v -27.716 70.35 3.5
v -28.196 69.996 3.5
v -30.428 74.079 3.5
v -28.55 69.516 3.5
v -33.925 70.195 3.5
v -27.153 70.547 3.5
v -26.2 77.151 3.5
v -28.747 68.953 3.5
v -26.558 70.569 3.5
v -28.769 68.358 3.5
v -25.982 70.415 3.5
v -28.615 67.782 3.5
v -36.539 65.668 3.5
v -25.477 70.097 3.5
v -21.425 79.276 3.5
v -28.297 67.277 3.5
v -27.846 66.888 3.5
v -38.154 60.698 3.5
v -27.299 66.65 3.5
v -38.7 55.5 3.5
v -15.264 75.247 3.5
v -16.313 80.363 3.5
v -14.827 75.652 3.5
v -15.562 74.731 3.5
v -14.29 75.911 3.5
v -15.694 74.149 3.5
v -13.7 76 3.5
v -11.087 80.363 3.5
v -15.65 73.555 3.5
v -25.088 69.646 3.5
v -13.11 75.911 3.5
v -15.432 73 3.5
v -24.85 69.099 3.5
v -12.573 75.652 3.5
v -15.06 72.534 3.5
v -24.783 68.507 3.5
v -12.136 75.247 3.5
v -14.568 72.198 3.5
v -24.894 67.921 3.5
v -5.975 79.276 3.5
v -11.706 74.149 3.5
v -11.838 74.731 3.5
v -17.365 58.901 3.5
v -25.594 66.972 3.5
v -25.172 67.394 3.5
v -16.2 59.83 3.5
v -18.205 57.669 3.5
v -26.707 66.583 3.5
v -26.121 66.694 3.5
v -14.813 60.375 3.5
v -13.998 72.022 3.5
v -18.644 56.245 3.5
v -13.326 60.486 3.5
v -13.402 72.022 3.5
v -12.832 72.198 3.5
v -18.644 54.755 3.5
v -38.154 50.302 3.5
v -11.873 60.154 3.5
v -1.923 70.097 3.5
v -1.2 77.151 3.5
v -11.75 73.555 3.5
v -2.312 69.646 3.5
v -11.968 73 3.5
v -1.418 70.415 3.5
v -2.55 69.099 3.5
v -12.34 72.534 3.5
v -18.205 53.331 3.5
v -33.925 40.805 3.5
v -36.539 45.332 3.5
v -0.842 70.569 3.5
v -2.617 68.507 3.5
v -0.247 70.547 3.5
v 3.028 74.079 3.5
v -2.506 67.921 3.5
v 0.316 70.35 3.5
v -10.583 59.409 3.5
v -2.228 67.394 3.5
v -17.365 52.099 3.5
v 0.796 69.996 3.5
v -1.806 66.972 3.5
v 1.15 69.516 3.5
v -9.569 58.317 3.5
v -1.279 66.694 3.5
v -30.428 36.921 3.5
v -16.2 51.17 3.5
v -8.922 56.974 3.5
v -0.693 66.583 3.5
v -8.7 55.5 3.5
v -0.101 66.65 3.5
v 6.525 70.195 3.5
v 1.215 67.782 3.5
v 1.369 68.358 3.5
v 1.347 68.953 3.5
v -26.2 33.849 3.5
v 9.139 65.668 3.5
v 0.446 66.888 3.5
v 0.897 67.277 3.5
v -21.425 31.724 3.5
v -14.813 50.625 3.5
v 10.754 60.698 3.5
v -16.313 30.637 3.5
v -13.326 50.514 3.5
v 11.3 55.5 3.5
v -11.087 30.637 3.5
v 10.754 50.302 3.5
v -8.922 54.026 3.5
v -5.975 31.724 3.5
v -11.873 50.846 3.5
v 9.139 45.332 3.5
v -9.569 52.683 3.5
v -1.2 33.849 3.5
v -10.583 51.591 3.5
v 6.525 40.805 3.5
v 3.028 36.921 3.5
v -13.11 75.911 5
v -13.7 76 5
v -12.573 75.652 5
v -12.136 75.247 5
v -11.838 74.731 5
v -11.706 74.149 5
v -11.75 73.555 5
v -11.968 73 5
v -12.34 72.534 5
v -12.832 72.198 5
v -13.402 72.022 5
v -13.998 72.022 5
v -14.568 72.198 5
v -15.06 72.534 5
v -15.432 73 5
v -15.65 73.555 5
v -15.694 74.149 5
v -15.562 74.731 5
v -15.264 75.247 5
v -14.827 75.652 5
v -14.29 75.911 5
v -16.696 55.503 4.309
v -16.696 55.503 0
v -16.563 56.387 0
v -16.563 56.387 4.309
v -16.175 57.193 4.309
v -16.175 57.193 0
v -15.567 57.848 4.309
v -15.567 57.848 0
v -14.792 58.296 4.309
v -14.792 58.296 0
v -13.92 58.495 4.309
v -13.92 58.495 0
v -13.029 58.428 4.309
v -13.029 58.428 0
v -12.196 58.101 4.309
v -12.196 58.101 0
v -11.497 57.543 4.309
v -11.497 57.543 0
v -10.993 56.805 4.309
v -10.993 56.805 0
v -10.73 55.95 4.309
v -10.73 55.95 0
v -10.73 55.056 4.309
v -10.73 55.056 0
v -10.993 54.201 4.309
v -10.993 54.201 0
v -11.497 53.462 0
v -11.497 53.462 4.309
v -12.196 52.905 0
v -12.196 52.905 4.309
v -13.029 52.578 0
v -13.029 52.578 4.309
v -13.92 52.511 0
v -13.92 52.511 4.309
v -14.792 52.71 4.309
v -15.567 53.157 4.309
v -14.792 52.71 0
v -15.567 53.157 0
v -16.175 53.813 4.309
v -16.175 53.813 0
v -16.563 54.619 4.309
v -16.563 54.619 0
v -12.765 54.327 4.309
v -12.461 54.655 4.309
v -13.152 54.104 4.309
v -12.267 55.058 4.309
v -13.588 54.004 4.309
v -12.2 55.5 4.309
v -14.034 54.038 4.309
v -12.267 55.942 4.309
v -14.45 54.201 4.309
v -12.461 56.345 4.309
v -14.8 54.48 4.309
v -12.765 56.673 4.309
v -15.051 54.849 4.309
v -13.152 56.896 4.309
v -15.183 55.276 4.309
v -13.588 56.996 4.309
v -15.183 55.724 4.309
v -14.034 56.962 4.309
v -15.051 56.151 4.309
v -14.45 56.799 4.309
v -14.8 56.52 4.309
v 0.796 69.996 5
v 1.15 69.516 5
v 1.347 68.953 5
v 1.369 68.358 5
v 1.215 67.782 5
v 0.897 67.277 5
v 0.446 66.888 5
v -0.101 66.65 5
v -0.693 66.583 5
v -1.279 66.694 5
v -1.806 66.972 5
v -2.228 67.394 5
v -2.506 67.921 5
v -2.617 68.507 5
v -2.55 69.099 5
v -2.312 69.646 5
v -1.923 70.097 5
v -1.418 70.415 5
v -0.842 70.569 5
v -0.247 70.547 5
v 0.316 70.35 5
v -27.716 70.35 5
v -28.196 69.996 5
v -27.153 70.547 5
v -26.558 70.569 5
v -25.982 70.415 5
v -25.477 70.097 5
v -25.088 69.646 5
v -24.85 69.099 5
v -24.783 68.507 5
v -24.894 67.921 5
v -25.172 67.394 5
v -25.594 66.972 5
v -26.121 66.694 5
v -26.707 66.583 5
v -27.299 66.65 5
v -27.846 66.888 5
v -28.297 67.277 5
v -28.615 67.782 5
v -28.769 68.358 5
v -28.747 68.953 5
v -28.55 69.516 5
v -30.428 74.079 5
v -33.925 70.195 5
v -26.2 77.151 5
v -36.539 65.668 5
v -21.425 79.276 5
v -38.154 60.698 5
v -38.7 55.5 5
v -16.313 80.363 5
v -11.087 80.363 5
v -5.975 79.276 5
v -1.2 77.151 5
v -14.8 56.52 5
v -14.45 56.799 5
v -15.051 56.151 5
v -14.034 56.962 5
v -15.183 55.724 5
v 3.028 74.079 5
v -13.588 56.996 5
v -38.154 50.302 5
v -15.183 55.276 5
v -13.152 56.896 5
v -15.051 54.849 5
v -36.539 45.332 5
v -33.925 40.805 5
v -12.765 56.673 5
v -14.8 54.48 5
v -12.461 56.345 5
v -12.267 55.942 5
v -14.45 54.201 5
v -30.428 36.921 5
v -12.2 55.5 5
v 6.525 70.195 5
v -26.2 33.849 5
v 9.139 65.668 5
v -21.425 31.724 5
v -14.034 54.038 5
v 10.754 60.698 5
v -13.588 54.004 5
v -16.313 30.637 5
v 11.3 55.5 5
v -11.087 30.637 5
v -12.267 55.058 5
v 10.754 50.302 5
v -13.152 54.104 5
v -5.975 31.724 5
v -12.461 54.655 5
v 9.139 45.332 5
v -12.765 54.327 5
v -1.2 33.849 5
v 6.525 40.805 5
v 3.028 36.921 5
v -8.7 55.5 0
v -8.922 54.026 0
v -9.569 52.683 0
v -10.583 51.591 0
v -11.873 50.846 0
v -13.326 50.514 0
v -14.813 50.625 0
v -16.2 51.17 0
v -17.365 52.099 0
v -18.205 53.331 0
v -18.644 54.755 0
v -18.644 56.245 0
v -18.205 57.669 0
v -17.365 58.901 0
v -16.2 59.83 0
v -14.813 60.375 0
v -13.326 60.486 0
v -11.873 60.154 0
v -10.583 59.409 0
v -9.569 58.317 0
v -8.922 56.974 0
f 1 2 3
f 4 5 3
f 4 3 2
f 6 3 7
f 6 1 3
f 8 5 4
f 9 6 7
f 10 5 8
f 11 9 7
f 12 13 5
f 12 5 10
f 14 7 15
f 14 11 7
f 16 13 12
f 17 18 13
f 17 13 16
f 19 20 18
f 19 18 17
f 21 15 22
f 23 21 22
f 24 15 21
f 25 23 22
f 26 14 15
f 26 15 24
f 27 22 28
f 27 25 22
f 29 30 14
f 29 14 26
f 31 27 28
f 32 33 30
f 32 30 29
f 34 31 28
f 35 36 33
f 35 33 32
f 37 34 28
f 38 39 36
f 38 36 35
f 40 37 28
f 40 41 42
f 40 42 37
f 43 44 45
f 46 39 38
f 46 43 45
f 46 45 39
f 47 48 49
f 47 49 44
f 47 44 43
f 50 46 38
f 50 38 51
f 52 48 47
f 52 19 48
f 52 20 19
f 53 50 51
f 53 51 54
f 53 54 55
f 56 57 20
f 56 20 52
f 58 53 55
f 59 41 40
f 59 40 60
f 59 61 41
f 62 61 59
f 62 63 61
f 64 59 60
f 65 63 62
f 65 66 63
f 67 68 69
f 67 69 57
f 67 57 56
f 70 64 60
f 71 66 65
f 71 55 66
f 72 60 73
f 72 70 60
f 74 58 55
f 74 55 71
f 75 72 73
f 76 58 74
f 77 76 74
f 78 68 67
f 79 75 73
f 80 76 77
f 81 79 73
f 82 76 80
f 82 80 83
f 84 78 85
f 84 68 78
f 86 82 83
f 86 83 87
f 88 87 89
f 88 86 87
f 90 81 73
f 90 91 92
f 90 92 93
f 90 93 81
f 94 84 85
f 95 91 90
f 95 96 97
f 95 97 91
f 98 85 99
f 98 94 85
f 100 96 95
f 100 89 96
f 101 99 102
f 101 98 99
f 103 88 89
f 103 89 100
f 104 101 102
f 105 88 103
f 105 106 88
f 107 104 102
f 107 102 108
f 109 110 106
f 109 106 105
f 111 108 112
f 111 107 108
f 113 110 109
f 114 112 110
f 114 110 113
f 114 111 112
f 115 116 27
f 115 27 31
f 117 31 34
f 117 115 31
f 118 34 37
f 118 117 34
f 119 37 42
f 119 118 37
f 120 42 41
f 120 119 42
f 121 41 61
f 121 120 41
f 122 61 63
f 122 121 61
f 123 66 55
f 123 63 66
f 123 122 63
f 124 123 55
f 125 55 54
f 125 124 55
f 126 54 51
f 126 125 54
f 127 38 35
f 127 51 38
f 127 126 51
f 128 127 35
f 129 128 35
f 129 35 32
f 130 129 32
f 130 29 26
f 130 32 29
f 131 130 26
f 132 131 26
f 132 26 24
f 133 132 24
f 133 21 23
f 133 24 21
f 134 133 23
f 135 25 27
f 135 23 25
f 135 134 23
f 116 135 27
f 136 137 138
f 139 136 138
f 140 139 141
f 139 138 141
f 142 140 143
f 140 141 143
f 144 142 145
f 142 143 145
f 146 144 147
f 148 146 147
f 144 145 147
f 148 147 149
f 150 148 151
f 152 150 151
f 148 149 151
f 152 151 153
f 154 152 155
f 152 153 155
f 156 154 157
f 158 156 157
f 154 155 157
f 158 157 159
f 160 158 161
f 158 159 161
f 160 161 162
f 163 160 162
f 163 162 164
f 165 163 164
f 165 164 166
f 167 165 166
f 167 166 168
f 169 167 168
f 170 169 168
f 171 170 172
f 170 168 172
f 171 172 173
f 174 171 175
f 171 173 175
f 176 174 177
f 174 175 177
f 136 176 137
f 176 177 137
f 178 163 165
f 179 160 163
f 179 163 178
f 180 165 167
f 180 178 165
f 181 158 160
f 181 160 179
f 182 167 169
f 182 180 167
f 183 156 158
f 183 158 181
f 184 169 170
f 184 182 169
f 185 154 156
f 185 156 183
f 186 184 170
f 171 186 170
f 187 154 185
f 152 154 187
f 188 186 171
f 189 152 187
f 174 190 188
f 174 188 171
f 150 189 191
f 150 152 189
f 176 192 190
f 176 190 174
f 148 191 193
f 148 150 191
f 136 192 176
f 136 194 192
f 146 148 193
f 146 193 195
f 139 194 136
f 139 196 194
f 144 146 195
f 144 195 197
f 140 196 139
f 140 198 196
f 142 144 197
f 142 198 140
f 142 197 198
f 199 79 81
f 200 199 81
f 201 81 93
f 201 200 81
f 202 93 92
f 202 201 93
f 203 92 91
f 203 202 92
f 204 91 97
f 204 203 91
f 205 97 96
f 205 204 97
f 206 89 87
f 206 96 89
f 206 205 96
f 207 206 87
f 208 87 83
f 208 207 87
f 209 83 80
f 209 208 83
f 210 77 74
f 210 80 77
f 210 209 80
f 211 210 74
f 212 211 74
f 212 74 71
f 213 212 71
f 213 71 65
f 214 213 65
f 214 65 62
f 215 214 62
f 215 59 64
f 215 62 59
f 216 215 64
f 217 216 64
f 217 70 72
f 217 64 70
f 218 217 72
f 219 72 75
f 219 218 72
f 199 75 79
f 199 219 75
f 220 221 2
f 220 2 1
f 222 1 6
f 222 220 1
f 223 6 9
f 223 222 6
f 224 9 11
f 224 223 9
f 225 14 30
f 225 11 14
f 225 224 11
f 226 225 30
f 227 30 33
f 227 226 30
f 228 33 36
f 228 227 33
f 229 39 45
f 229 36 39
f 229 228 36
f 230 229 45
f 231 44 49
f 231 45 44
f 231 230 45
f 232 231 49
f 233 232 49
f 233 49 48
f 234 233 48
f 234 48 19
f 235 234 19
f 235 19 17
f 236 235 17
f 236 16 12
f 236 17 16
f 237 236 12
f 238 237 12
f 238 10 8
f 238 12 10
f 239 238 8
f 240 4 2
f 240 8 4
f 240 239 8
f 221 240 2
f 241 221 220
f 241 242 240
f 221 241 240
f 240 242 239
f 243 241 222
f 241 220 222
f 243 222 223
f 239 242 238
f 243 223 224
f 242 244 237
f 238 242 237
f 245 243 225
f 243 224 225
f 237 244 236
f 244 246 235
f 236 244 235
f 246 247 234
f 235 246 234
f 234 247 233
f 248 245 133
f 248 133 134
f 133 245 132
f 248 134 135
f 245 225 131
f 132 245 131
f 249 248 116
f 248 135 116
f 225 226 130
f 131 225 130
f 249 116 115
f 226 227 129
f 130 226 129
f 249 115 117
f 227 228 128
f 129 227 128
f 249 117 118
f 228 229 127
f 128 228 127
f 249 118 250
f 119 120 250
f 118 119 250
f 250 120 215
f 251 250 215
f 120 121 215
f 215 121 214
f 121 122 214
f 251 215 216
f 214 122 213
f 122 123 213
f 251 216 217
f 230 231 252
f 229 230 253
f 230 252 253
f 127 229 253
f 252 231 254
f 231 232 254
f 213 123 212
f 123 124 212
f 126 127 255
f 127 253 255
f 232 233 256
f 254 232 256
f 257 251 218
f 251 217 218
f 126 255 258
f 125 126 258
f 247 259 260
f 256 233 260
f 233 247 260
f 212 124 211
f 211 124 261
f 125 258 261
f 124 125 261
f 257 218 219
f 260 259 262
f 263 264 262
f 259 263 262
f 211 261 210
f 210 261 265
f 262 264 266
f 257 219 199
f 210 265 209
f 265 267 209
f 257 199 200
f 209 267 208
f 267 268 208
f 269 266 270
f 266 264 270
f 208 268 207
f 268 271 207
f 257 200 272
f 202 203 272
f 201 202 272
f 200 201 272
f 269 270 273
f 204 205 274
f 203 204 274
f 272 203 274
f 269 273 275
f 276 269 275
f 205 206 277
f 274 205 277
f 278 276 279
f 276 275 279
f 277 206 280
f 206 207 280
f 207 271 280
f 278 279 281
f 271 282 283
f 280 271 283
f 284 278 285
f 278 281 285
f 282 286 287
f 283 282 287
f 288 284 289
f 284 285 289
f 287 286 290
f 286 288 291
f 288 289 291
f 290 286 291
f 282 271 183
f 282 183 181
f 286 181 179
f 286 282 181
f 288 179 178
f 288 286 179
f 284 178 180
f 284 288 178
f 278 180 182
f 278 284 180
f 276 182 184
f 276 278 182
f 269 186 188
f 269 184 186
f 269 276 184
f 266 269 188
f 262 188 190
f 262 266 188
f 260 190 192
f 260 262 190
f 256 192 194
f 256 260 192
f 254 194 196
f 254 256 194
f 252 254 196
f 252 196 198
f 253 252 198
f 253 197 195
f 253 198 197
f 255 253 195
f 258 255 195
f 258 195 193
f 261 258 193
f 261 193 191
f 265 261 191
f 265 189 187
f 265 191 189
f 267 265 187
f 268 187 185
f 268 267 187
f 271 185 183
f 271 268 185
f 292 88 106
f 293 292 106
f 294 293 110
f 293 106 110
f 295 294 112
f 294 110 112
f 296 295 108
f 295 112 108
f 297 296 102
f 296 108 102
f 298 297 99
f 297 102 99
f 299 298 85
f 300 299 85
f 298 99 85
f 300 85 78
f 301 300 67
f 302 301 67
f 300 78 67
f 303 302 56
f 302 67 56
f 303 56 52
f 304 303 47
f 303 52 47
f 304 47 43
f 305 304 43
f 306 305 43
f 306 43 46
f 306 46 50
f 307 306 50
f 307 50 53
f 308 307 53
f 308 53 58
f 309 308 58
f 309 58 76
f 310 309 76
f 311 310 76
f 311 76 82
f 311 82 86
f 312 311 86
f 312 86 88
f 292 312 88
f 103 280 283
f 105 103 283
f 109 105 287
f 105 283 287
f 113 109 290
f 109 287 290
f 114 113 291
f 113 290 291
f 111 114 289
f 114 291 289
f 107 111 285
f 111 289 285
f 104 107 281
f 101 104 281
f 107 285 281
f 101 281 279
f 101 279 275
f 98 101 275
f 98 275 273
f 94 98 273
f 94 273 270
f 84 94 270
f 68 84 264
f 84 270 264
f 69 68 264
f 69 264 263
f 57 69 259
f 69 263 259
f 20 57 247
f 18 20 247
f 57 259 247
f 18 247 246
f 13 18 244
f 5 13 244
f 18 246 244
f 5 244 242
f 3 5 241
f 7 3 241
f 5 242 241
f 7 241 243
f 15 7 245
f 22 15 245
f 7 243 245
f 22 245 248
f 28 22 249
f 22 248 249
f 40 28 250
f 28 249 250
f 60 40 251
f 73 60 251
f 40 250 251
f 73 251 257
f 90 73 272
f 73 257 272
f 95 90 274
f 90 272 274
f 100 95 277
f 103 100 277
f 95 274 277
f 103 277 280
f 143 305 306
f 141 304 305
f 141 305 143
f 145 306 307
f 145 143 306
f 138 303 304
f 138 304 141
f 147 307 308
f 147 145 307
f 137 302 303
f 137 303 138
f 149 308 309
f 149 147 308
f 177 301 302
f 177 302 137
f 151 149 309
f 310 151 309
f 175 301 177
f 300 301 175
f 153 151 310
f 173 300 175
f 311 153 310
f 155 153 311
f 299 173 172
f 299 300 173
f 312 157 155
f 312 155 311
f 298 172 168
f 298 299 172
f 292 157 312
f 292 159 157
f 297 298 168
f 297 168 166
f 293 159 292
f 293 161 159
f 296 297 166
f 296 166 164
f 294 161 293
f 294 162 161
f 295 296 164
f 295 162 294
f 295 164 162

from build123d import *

# Parameters (mm, degrees)
SKETCH002_R                 = 3
EXTRUDE002_DEPTH            = 4
EXTRUDE002_DEPTH_BACK       = 3.4
CYLINDER049_R               = 1.5
CYLINDER049_DEPTH           = 19
CYLINDER014_R               = 2
CYLINDER014_DEPTH           = 1
CYLINDER014_PLACEMENT_ANGLE = 45
CYLINDER015_R               = 2
CYLINDER015_DEPTH           = 1
CYLINDER016_R               = 2
CYLINDER016_DEPTH           = 1
CYLINDER016_PLACEMENT_ANGLE = 135
CYLINDER017_R               = 2
CYLINDER017_DEPTH           = 1
CYLINDER018_R               = 2
CYLINDER018_DEPTH           = 5
CYLINDER018_PLACEMENT_ANGLE = 225
CYLINDER019_R               = 2
CYLINDER019_DEPTH           = 5
CYLINDER020_R               = 2
CYLINDER020_DEPTH           = 5
CYLINDER020_PLACEMENT_ANGLE = 45
CYLINDER013_R               = 2
CYLINDER013_DEPTH           = 1
CYLINDER021_R               = 5
CYLINDER021_DEPTH           = 5
CYLINDER012_R               = 25
CYLINDER012_DEPTH           = 1.5
CUT050_PLACEMENT_ANGLE      = 180


with BuildPart() as extrude002:
    # Sketch002 (on Face25 of Shape005) → Extrude002 (new body, two sides)
    with BuildSketch(Plane(origin=(85.664098, -4.553146, 1.091283), x_dir=(-1, 0, 0), z_dir=(0, 0, 1))) as extrude002_sk:
        with Locations((9.450198, -0.000218)):
            Circle(SKETCH002_R)
    extrude(amount=EXTRUDE002_DEPTH)
    extrude(extrude002_sk.sketch, amount=-EXTRUDE002_DEPTH_BACK)


with BuildPart() as extrude002_1:
    # Extrude002 placement: moved
    add(extrude002.part.moved(Location((-76.21, 4.55, 3))))


with BuildPart() as cylinder049:
    # Cylinder049 → Cylinder049 (new body)
    with BuildSketch(Plane.XY.offset(-1)):
        Circle(CYLINDER049_R)
    extrude(amount=CYLINDER049_DEPTH)


with BuildPart() as cylinder014:
    # cylinder014 → cylinder014 (new body)
    with BuildSketch(Plane.XY):
        Circle(CYLINDER014_R)
    extrude(amount=CYLINDER014_DEPTH)


with BuildPart() as cylinder014_1:
    # cylinder014 placement: moved
    add(cylinder014.part.moved(Location((13.081475, 13.081475, 0))).rotate(Axis((13.081475, 13.081475, 0), (0, 0, 1)), CYLINDER014_PLACEMENT_ANGLE))


with BuildPart() as cylinder015:
    # cylinder015 → cylinder015 (new body)
    with BuildSketch(Plane(origin=(0, 18.5, 0), x_dir=(0, 1, 0), z_dir=(0, 0, 1))):
        Circle(CYLINDER015_R)
    extrude(amount=CYLINDER015_DEPTH)


with BuildPart() as cylinder016:
    # cylinder016 → cylinder016 (new body)
    with BuildSketch(Plane.XY):
        Circle(CYLINDER016_R)
    extrude(amount=CYLINDER016_DEPTH)


with BuildPart() as cylinder016_1:
    # cylinder016 placement: moved
    add(cylinder016.part.moved(Location((-13.081475, 13.081475, 0))).rotate(Axis((-13.081475, 13.081475, 0), (0, 0, 1)), CYLINDER016_PLACEMENT_ANGLE))


with BuildPart() as cylinder017:
    # cylinder017 → cylinder017 (new body)
    with BuildSketch(Plane(origin=(-18.5, 0, 0), x_dir=(-1, 0, 0), z_dir=(0, 0, 1))):
        Circle(CYLINDER017_R)
    extrude(amount=CYLINDER017_DEPTH)


with BuildPart() as cylinder018:
    # cylinder018 → cylinder018 (new body)
    with BuildSketch(Plane.XY):
        Circle(CYLINDER018_R)
    extrude(amount=CYLINDER018_DEPTH)


with BuildPart() as cylinder018_1:
    # cylinder018 placement: moved
    add(cylinder018.part.moved(Location((-13.081475, -13.081475, 0))).rotate(Axis((-13.081475, -13.081475, 0), (0, 0, 1)), CYLINDER018_PLACEMENT_ANGLE))


with BuildPart() as cylinder019:
    # cylinder019 → cylinder019 (new body)
    with BuildSketch(Plane(origin=(0, -18.5, 0), x_dir=(0, -1, 0), z_dir=(0, 0, 1))):
        Circle(CYLINDER019_R)
    extrude(amount=CYLINDER019_DEPTH)


with BuildPart() as cylinder020:
    # cylinder020 → cylinder020 (new body)
    with BuildSketch(Plane.XY):
        Circle(CYLINDER020_R)
    extrude(amount=CYLINDER020_DEPTH)


with BuildPart() as cylinder020_1:
    # cylinder020 placement: moved
    add(cylinder020.part.moved(Location((13.081475, -13.081475, 0))).rotate(Axis((13.081475, -13.081475, 0), (0, 0, -1)), CYLINDER020_PLACEMENT_ANGLE))


with BuildPart() as fusion026:
    # cylinder013 → cylinder013 (new body)
    with BuildSketch(Plane(origin=(18.5, 0, 0), x_dir=(1, 0, 0), z_dir=(0, 0, 1))):
        Circle(CYLINDER013_R)
    extrude(amount=CYLINDER013_DEPTH)

    # Group001: union cylinder014, cylinder015, cylinder016, cylinder017, cylinder018, cylinder019, cylinder020
    add(cylinder014_1.part)
    add(cylinder015.part)
    add(cylinder016_1.part)
    add(cylinder017.part)
    add(cylinder018_1.part)
    add(cylinder019.part)
    add(cylinder020_1.part)


with BuildPart() as fusion026_1:
    # Group001 placement: moved
    add(fusion026.part.moved(Location((0, 0, -1))))

    # Fusion026: union Extrude002, Cylinder049
    add(extrude002_1.part)
    add(cylinder049.part)


with BuildPart() as servo_central_shaft002:
    # cylinder021 → cylinder021 (new body)
    with BuildSketch(Plane.XY):
        Circle(CYLINDER021_R)
    extrude(amount=CYLINDER021_DEPTH)


with BuildPart() as rotor:
    # cylinder012 → cylinder012 (new body)
    with BuildSketch(Plane.XY):
        Circle(CYLINDER012_R)
    extrude(amount=CYLINDER012_DEPTH)

    # Fusion027: union servo_central_shaft002
    add(servo_central_shaft002.part)

    # Cut050: cut Fusion026
    add(fusion026_1.part, mode=Mode.SUBTRACT)


with BuildPart() as rotor_1:
    # Cut050 placement: moved
    add(rotor.part.moved(Location((-13.7, 55.5, 5))).rotate(Axis((-13.7, 55.5, 5), (1, 0, 0)), CUT050_PLACEMENT_ANGLE))


solid = rotor_1.part
